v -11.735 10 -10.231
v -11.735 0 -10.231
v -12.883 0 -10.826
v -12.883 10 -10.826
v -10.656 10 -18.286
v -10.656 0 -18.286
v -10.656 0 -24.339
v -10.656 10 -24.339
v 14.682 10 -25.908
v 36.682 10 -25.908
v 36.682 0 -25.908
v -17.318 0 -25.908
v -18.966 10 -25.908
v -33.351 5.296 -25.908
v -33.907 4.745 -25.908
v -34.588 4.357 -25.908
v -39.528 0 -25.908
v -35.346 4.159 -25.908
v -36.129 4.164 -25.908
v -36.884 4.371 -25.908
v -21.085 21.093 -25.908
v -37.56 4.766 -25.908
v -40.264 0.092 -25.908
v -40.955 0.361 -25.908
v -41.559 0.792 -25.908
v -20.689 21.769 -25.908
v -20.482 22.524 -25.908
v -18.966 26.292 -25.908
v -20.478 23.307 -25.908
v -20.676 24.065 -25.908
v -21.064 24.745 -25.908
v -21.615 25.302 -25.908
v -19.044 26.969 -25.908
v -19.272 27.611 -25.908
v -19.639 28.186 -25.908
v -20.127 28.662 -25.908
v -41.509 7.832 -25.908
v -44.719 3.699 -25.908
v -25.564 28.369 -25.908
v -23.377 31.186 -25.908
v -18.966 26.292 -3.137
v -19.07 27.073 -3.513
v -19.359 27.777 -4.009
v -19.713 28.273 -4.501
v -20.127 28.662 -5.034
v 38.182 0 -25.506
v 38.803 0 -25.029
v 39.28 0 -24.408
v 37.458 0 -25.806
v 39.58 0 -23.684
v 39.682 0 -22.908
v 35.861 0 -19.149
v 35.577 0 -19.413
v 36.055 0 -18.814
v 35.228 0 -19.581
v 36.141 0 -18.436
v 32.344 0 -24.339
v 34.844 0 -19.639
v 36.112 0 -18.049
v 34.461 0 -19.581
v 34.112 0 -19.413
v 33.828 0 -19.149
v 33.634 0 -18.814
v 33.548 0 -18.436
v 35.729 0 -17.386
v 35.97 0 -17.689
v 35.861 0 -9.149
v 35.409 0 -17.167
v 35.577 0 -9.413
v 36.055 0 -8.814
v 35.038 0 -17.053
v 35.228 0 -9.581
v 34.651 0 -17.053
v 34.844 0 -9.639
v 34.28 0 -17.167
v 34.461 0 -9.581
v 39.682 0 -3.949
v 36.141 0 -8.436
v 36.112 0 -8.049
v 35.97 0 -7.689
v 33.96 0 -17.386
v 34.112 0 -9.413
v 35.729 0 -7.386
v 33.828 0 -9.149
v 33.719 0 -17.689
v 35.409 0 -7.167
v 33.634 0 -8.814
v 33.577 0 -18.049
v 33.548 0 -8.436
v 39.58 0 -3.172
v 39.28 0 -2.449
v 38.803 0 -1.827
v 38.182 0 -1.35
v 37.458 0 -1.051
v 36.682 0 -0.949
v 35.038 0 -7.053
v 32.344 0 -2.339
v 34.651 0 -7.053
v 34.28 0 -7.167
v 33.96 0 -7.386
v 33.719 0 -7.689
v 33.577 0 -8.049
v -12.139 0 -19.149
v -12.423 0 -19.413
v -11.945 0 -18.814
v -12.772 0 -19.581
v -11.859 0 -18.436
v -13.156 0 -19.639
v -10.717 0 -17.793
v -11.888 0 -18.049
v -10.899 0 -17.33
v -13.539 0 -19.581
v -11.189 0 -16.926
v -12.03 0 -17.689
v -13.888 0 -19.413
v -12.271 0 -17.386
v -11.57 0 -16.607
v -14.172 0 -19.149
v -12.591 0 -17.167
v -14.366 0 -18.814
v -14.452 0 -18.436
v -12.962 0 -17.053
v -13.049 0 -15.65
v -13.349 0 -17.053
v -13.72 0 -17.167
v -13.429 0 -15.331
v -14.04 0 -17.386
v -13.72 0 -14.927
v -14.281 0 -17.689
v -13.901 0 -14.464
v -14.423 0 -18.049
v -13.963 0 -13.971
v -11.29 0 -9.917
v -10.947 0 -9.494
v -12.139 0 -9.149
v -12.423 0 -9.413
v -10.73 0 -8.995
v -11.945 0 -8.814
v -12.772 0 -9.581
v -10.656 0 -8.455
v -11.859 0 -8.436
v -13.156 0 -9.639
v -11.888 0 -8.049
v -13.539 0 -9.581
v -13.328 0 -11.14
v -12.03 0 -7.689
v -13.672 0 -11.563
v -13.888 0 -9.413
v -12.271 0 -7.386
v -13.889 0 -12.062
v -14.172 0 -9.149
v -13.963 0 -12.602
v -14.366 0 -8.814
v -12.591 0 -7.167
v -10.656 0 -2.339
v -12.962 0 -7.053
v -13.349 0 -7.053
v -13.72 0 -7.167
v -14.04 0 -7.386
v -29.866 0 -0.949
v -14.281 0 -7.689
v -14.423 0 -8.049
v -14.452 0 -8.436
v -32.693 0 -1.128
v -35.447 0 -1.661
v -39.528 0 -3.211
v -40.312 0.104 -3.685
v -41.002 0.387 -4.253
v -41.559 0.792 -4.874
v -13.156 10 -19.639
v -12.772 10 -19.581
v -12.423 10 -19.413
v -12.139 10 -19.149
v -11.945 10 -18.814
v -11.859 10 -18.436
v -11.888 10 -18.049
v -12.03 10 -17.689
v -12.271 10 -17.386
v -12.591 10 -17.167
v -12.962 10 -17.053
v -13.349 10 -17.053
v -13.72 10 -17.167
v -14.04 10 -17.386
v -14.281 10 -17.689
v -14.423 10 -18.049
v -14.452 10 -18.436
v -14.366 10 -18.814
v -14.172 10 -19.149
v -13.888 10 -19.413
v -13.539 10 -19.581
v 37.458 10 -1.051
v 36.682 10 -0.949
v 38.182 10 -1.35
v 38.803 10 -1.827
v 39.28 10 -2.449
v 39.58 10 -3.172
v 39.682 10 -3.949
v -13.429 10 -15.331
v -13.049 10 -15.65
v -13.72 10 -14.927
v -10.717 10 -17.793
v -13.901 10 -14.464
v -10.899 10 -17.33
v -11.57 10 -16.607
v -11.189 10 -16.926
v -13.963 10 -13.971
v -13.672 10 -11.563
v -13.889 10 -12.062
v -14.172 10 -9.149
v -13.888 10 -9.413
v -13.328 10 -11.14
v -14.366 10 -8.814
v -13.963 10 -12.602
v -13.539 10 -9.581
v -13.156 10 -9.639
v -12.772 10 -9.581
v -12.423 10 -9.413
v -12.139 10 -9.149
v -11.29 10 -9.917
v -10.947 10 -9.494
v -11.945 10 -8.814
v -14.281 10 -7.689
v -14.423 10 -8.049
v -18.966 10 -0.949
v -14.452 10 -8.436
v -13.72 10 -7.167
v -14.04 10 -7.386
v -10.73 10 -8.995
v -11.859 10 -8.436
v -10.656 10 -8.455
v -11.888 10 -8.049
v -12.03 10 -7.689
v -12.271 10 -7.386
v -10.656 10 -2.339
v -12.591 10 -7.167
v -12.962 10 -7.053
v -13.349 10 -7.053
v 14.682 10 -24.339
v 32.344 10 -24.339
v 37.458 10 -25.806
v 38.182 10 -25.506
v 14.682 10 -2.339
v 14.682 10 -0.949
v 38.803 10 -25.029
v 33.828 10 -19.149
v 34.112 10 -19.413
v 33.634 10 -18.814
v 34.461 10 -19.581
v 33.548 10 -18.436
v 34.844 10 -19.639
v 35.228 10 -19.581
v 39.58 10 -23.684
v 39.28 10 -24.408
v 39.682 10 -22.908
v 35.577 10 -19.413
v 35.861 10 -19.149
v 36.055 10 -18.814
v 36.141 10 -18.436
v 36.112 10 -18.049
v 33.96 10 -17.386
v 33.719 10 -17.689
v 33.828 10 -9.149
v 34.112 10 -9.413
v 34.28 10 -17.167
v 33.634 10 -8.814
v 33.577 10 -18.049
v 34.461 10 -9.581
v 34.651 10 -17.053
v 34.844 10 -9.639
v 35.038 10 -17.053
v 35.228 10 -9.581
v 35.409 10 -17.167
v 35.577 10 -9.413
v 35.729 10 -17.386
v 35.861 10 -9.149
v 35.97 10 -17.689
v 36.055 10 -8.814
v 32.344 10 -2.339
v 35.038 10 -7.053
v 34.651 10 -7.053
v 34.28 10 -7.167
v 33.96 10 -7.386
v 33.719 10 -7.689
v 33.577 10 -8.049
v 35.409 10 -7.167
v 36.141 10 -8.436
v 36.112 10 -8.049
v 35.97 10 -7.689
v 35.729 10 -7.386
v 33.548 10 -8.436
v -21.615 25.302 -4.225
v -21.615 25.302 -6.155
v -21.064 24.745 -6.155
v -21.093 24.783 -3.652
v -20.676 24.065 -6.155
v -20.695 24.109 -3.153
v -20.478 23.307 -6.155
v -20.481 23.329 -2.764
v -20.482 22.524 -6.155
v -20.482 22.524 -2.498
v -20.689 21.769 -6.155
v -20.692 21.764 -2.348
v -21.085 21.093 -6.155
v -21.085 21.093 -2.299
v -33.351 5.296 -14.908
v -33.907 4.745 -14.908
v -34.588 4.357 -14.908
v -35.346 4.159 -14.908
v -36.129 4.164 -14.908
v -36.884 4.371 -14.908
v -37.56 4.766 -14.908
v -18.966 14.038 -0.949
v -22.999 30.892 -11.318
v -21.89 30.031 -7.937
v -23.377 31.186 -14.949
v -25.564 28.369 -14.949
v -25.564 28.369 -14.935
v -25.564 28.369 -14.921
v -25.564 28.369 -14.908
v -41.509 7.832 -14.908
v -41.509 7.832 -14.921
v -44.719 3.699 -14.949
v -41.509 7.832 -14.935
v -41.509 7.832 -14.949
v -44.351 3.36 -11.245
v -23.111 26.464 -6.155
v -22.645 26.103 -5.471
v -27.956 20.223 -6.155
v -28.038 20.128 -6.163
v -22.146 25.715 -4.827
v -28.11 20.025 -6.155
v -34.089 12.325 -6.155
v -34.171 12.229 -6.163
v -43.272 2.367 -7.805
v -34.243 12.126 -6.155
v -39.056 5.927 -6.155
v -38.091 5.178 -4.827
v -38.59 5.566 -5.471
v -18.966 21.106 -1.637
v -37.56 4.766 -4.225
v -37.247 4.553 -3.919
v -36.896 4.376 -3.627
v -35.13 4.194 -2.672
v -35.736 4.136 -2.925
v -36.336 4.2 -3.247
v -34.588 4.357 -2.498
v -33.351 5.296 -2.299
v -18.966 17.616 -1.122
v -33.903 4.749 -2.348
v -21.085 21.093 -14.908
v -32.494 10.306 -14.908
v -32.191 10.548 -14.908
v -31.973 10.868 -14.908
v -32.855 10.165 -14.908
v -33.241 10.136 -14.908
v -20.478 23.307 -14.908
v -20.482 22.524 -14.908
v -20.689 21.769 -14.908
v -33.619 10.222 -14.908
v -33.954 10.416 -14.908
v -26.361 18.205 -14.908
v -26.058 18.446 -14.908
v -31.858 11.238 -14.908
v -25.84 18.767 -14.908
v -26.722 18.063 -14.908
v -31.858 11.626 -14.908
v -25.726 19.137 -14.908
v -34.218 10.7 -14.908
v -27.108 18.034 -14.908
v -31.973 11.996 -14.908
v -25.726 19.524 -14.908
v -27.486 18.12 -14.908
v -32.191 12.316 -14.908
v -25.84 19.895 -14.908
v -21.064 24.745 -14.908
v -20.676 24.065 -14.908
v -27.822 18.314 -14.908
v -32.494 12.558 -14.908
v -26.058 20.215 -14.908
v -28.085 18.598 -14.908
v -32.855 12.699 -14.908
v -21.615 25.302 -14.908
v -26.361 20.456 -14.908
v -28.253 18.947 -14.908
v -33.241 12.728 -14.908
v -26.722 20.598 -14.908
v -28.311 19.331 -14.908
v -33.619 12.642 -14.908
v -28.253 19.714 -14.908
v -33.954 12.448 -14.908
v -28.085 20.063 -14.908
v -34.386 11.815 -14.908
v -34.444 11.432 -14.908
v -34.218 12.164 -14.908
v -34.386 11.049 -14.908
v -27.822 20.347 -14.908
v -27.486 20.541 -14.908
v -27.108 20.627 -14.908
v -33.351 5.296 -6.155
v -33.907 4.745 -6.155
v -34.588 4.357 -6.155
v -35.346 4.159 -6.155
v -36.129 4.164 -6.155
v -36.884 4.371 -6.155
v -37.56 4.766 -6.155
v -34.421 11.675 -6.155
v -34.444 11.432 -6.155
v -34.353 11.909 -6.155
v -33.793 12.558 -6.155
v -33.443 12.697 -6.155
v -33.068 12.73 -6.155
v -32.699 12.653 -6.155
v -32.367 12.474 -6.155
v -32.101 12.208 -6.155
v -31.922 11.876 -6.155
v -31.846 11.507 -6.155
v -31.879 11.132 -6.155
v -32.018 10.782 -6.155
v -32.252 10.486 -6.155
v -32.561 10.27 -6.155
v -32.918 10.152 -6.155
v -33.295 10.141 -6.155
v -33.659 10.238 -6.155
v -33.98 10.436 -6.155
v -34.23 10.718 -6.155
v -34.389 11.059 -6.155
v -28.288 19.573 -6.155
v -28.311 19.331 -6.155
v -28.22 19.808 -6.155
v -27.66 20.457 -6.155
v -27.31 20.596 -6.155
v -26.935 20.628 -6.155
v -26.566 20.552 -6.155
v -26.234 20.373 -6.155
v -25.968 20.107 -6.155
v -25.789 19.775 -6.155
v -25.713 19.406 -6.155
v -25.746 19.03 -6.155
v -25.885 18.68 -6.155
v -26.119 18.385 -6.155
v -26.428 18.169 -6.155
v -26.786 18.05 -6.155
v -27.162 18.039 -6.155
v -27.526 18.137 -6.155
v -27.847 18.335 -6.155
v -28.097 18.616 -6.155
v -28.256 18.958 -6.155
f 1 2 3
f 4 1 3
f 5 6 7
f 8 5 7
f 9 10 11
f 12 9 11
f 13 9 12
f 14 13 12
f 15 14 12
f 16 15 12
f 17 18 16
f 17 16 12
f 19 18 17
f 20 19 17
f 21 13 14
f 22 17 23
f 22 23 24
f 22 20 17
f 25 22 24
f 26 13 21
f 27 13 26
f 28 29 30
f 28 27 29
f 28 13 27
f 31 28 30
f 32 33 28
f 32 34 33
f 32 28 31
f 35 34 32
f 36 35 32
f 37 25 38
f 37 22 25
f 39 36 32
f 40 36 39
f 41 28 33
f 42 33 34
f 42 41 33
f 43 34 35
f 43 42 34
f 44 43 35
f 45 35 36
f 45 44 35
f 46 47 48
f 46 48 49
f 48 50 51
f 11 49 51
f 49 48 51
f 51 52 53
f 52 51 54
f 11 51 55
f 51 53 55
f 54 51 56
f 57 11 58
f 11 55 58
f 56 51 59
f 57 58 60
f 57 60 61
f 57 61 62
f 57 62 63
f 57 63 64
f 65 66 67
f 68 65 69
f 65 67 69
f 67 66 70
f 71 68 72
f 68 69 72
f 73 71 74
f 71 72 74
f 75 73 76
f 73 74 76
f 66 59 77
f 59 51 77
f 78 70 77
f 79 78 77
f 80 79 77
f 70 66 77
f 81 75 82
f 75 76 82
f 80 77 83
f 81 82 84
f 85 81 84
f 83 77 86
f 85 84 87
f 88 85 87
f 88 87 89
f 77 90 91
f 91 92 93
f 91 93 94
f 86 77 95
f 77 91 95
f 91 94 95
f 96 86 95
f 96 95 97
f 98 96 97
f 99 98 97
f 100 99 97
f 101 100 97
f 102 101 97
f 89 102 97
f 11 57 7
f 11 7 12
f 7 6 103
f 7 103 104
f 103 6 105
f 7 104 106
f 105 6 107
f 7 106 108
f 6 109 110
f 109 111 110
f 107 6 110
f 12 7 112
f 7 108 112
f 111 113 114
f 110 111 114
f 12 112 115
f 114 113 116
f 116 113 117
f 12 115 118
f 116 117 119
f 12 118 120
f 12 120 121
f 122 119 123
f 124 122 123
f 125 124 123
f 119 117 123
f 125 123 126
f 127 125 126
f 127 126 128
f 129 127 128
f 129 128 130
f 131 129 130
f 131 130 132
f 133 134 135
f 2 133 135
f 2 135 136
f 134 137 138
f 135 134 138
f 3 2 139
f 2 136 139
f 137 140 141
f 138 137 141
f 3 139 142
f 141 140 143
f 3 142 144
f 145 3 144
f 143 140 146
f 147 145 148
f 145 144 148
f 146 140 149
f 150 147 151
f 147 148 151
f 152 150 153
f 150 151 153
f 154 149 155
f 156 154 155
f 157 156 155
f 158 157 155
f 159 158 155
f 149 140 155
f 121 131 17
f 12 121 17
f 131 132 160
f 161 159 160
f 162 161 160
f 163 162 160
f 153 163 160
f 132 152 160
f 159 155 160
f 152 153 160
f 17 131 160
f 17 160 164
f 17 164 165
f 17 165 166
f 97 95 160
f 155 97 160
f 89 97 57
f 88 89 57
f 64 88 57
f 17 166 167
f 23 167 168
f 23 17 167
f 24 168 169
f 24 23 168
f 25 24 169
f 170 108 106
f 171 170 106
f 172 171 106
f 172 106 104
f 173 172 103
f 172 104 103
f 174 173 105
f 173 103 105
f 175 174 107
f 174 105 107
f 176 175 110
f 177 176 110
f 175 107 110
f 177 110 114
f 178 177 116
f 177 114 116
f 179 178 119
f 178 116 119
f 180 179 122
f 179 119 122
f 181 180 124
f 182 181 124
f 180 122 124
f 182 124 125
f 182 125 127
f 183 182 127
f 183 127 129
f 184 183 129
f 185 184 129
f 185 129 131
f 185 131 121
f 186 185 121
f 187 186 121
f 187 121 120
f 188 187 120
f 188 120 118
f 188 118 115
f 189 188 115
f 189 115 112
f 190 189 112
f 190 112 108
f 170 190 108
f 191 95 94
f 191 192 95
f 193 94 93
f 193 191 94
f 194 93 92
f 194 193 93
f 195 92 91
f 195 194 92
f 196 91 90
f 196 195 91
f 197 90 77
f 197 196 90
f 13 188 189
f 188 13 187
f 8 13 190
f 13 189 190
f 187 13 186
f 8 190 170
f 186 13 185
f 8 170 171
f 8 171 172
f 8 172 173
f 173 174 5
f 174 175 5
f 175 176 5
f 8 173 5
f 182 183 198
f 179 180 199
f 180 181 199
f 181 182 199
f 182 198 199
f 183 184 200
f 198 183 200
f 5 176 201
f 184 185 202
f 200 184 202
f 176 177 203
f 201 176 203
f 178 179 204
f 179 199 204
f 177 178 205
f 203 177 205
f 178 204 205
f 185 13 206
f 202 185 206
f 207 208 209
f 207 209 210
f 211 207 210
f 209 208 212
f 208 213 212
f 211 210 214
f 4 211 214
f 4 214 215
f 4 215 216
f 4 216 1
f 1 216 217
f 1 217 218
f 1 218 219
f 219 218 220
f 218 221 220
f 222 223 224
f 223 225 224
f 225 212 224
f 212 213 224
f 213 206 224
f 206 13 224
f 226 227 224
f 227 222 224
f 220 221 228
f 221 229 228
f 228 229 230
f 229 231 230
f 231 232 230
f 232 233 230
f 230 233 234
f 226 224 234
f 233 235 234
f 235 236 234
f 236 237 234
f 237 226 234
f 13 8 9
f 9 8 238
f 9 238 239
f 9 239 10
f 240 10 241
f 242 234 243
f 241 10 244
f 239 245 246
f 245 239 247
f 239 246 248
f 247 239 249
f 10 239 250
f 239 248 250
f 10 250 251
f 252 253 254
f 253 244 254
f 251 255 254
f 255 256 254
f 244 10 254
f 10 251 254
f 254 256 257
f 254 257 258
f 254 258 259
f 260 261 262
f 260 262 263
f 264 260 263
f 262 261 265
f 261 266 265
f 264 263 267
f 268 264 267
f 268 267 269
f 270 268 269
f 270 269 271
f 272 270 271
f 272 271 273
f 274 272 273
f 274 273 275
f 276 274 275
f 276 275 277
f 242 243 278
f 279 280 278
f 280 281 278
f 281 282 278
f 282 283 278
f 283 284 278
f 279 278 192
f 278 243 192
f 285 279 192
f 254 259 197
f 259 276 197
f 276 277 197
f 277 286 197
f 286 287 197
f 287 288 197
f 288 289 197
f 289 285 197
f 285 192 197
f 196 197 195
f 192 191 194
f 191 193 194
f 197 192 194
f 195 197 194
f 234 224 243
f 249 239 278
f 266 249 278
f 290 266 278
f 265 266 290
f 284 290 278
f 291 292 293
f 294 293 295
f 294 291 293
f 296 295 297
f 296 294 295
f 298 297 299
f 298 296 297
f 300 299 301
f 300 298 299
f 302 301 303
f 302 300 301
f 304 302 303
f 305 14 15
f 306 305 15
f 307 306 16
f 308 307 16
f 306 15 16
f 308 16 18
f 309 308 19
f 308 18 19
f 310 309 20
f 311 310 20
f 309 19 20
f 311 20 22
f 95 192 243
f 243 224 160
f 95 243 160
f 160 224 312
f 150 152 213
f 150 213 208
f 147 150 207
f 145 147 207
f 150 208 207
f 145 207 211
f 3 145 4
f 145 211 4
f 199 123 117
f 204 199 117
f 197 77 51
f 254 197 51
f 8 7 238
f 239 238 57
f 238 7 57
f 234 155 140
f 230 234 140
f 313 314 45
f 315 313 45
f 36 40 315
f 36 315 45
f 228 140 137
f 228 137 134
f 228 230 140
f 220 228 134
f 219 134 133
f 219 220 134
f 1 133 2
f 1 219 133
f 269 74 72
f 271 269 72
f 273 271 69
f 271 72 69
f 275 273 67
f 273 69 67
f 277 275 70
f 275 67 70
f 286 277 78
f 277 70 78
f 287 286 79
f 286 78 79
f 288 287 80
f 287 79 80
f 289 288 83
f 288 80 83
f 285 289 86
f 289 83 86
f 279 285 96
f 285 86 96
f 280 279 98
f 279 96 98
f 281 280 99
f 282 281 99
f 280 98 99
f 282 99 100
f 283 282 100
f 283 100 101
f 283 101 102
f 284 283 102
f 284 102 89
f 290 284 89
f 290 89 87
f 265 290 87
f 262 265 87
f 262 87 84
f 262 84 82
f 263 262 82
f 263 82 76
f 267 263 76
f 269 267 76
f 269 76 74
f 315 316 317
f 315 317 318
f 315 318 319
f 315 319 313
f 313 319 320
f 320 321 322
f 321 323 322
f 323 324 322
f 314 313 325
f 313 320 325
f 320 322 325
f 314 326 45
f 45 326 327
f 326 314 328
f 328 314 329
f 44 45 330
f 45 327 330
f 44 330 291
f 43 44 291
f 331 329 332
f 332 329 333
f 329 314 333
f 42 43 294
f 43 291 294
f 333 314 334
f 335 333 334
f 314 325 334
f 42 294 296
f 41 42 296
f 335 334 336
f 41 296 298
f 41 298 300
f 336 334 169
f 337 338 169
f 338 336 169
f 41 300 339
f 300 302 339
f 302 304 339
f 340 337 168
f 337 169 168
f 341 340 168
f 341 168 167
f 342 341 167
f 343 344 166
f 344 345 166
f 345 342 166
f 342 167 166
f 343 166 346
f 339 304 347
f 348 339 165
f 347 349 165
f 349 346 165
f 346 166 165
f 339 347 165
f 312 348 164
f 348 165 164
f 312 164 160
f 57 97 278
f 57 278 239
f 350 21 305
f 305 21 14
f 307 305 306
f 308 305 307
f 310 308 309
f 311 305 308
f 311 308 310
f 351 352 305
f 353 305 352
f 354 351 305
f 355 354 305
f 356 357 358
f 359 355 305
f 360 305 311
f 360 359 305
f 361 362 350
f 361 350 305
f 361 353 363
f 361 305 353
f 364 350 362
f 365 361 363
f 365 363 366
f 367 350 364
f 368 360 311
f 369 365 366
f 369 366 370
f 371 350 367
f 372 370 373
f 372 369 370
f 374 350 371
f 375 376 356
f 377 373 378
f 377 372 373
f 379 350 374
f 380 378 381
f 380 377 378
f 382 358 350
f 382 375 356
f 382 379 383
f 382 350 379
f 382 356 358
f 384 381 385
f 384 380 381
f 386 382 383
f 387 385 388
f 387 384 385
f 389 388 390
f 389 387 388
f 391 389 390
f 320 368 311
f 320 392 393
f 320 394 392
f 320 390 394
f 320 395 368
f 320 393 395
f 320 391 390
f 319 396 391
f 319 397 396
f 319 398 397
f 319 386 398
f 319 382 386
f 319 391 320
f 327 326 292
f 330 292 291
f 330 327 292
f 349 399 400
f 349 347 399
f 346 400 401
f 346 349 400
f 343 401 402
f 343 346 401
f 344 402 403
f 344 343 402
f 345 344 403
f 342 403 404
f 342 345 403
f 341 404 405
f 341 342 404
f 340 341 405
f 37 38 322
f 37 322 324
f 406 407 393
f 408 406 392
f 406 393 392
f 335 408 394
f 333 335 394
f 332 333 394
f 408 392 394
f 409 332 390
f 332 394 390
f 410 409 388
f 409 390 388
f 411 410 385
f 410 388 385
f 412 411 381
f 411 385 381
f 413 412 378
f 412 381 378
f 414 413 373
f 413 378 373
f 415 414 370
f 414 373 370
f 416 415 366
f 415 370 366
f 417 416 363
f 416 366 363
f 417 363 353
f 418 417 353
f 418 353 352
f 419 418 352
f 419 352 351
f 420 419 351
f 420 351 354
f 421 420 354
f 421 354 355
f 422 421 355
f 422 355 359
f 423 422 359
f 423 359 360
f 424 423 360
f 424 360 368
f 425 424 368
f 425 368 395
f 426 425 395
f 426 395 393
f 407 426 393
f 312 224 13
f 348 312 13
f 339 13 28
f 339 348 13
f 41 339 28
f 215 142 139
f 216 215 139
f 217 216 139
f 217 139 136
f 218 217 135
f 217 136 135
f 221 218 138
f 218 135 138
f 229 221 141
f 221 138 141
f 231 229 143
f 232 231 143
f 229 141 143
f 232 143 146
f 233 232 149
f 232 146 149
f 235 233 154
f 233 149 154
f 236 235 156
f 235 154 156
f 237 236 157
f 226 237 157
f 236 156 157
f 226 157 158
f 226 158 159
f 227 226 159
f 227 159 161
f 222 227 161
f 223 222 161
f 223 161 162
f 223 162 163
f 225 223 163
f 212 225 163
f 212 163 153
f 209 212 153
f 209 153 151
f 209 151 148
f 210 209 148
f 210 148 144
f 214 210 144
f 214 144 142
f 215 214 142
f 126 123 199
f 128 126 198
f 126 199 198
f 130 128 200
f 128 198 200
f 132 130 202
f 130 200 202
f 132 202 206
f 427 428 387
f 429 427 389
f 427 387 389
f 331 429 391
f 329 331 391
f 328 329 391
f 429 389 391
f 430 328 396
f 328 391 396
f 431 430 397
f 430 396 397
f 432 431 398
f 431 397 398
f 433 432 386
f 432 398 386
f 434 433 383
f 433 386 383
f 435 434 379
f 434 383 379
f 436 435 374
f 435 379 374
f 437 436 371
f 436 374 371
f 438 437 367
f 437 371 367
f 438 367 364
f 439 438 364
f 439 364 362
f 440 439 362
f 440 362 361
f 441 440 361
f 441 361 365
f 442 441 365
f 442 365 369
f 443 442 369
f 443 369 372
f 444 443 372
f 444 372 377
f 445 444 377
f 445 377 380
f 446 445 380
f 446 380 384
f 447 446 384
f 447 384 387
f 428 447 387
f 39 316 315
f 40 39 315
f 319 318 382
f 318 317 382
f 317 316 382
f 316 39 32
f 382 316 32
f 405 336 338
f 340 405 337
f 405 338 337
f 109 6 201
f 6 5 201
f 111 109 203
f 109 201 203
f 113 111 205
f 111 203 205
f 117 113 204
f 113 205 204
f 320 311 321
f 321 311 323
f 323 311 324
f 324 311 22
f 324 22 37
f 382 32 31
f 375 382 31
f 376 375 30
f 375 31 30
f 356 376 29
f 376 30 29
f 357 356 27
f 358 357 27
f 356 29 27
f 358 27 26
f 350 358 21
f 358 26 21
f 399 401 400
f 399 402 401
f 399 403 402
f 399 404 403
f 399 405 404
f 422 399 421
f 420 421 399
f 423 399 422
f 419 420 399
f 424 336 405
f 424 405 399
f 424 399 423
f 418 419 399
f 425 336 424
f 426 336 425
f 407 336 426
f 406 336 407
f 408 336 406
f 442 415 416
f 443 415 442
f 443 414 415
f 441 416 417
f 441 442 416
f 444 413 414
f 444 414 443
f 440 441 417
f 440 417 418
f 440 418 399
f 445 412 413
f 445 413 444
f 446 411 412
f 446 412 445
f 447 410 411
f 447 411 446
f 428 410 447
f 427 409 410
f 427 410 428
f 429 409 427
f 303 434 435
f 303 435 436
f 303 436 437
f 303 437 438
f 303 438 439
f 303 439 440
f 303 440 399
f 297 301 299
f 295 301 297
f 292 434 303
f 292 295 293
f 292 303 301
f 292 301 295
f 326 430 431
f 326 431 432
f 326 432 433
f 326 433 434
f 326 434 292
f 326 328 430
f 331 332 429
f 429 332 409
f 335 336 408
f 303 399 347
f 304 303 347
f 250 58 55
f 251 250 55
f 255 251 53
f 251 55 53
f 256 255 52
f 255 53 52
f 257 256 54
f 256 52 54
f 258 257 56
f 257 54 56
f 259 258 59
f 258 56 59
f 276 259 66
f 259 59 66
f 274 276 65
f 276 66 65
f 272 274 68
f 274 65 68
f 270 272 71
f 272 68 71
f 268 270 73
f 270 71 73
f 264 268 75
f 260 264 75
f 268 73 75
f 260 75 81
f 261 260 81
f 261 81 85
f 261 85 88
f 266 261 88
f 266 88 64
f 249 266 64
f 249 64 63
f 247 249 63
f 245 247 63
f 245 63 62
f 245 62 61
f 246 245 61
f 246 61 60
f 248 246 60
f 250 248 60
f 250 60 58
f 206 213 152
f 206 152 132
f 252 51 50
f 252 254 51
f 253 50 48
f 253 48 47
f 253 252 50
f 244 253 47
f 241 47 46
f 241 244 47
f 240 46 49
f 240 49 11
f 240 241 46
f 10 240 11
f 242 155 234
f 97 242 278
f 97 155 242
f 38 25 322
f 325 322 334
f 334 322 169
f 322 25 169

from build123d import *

# Parameters (mm, degrees)
CROQUIS1_W                        = 57
CROQUIS1_H                        = 24.959470006
CROQUIS1_W_2                      = 43
CROQUIS1_H_2                      = 22
MAIN_DEPTH                        = 28
CORTE_CAJA_REACH                  = 56.604
CROQUIS2_W                        = 27.955905163
CROQUIS2_H                        = 20.987971864
CROQUIS3_W                        = 32
CROQUIS3_H                        = 24.959470006
SALIENTE_EXTRUIR2_DEPTH           = 2.25
REDONDEO_LATERALES_R              = 3
CROQUIS7_R                        = 1.3
TALADROS_BASE_DEPTH               = 11
CAJEADO_CABLE_DEPTH               = 10
CAJEADO_REDONDEO_R                = 2
SOPORTE_EN_ANGULO_DEPTH           = 24.959470007
CAJA_PARA_SOPORTE_DEPTH           = 11
CROQUIS12_R                       = 1.3
TALADROS_CAJA_SOPORTE_DEPTH       = 13.959470007
CROQUIS15_W                       = 60.00042655
CROQUIS15_H                       = 27.426571923
RECORTE_CAJA_DEPTH                = 24.959470007
CHAFLAN_SUPERIOR_SOPORTE_DEPTH    = 24.959470007
REDONDEO_ARISTAS_SOPORTE_R        = 3
REDONDEO_SOPORTE_R                = 14
CROQUIS17_W                       = 6.155207263
CROQUIS17_H                       = 26
CAJA_TORNILLOS_SOPORTE_DEPTH      = 8
REDONDEO_CAJA_TORNILLOS_SOPORTE_R = 3


with BuildPart() as part:
    # Croquis1 → Main (new body)
    with BuildSketch(Plane(origin=(0, 0, 0), x_dir=(1, 0, 0), z_dir=(0, 1, 0))):
        with Locations((11.181999645, 13.428246359)):
            Rectangle(CROQUIS1_W, CROQUIS1_H)
        with Locations((10.844499645, 13.338562849)):
            Rectangle(CROQUIS1_W_2, CROQUIS1_H_2, mode=Mode.SUBTRACT)
    extrude(amount=MAIN_DEPTH)

    # Corte Caja: up to this face of the body (flat: up to its plane)
    corte_caja_end = Plane(part.part.faces().sort_by_distance((11.181999645, 14, -25.907981362))[0])
    # Croquis2 → Corte Caja (cut, up to the picked face)
    with BuildSketch(Plane.XY.offset(-0.948511356), mode=Mode.PRIVATE) as corte_caja_sk1:
        with Locations((28.659952227, 20.493985932)):
            Rectangle(CROQUIS2_W, CROQUIS2_H)
    corte_caja_tool1 = split(extrude(corte_caja_sk1.sketch, amount=-CORTE_CAJA_REACH, mode=Mode.PRIVATE), bisect_by=corte_caja_end, keep=Keep.BOTH, mode=Mode.PRIVATE)
    add(corte_caja_tool1.solids().sort_by(Axis((28.659952, 20.493986, -0.948511), (0, 0, -1)))[0], mode=Mode.SUBTRACT)

    # Croquis3 → Saliente-Extruir2 (add)
    with BuildSketch(Plane(origin=(0, 28, 0), x_dir=(1, 0, 0), z_dir=(0, 1, 0))):
        with Locations((-1.318000355, 13.428246359)):
            Rectangle(CROQUIS3_W, CROQUIS3_H)
    extrude(amount=SALIENTE_EXTRUIR2_DEPTH)

    # Redondeo Laterales
    redondeo_laterales_edges = [part.edges().sort_by_distance(p)[0] for p in [
        (39.681999645, 5, -25.907981362),
        (39.681999645, 5, -0.948511356),
    ]]
    fillet(redondeo_laterales_edges, radius=REDONDEO_LATERALES_R)

    # Croquis7 → Taladros Base (cut)
    with BuildSketch(Plane.XZ):
        with Locations(Location((-13.155500355, -8.338562849, 0), (0, 0, 270))):
            Circle(CROQUIS7_R)
        with Locations(Location((-13.155500355, -18.338562849, 0), (0, 0, 270))):
            Circle(CROQUIS7_R)
        with Locations(Location((34.844499645, -8.338562849, 0), (0, 0, 270))):
            Circle(CROQUIS7_R)
        with Locations(Location((34.844499645, -18.338562849, 0), (0, 0, 270))):
            Circle(CROQUIS7_R)
    extrude(amount=-TALADROS_BASE_DEPTH, mode=Mode.SUBTRACT)

    # Croquis8 → Cajeado cable (cut)
    with BuildSketch(Plane.XZ):
        Polygon((-10.655500355, -17.197519433), (-10.655500355, -9.671098091), (-13.962983419, -11.385752006), (-13.962983419, -15.059503242), align=None)
    extrude(amount=-CAJEADO_CABLE_DEPTH, mode=Mode.SUBTRACT)

    # Cajeado Redondeo
    cajeado_redondeo_edges = [part.edges().sort_by_distance(p)[0] for p in [
        (-13.962983419, 5, -11.385752006),
        (-10.655500355, 5, -9.671098091),
        (-10.655500355, 5, -17.197519433),
        (-13.962983419, 5, -15.059503242),
    ]]
    fillet(cajeado_redondeo_edges, radius=CAJEADO_REDONDEO_R)

    # Croquis10 → Soporte en angulo (add)
    with BuildSketch(Plane.XY.offset(-0.948511356)):
        Polygon((-17.318000355, 30.25), (-17.318000355, 0), (-40.697936457, 0), (-44.719041018, 3.698501078), (-22.354269001, 32.502718411), (-18.018493057, 32.502718411), align=None)
    extrude(amount=-SOPORTE_EN_ANGULO_DEPTH)

    # Croquis11 → Caja para soporte (cut)
    with BuildSketch(Plane(origin=(0, 0, -25.907981362), x_dir=(-1, 0, 0), z_dir=(0, 0, -1))):
        with BuildLine():
            Line((41.509326916, 7.83238192), (25.563983103, 28.36883757))
            Line((25.563983103, 28.36883757), (21.614664709, 25.302425298))
            ThreePointArc((21.614664709, 25.302425298), (20.477989634, 23.307419605), (21.084921035, 21.092986898))
            Line((21.084921035, 21.092986898), (33.350570122, 5.295713321))
            ThreePointArc((33.350570122, 5.295713321), (35.345575815, 4.159038247), (37.560008522, 4.765969648))
            Line((37.560008522, 4.765969648), (41.509326916, 7.83238192))
        make_face()
    extrude(amount=-CAJA_PARA_SOPORTE_DEPTH, mode=Mode.SUBTRACT)

    # Croquis12 → Taladros caja soporte (cut)
    with BuildSketch(Plane(origin=(0, 0, -14.907981362), x_dir=(-1, 0, 0), z_dir=(0, 0, -1))):
        with Locations((27.011052418, 19.330608197)):
            Circle(CROQUIS12_R)
        with Locations((33.143876962, 11.431971409)):
            Circle(CROQUIS12_R)
    extrude(amount=-TALADROS_CAJA_SOPORTE_DEPTH, mode=Mode.SUBTRACT)

    # Croquis15 → Recorte Caja (cut)
    with BuildSketch(Plane.XY.offset(-0.948511356)):
        with Locations((11.033774869, 23.713285962)):
            Rectangle(CROQUIS15_W, CROQUIS15_H)
    extrude(amount=-RECORTE_CAJA_DEPTH, mode=Mode.SUBTRACT)

    # Croquis16 → Chaflan superior soporte (cut)
    with BuildSketch(Plane(origin=(0, 0, -25.907981362), x_dir=(-1, 0, 0), z_dir=(0, 0, -1))):
        Polygon((26.059899943, 33.268736427), (17.368016439, 26.520002701), (17.368016439, 33.268736427), align=None)
    extrude(amount=-CHAFLAN_SUPERIOR_SOPORTE_DEPTH, mode=Mode.SUBTRACT)

    # Redondeo aristas soporte
    redondeo_aristas_soporte_edges = [part.edges().sort_by_distance(p)[0] for p in [
        (-40.697936457, 0, -13.428246359),
        (-18.966438406, 27.761082869, -13.428246359),
    ]]
    fillet(redondeo_aristas_soporte_edges, radius=REDONDEO_ARISTAS_SOPORTE_R)

    # Redondeo soporte
    # the kernel refuses this fillet: 14 mm, written as the material it takes off along each edge
    with BuildSketch(Plane(origin=(-66.183926921, -23.946727682, -0.948511356), x_dir=(0.7898636788540391, -0.6132824543610909, 0), z_dir=(0.6132824543610909, 0.7898636788540392, 0))) as redondeo_soporte_piece_1:
        with BuildLine():
            CenterArc((REDONDEO_SOPORTE_R, REDONDEO_SOPORTE_R), REDONDEO_SOPORTE_R, 180, 90)
            Line((0, REDONDEO_SOPORTE_R), (0, 0))
            Line((0, 0), (REDONDEO_SOPORTE_R, 0))
        make_face()
    extrude(amount=104.799778712, mode=Mode.SUBTRACT)

    # Croquis17 → Caja tornillos soporte (cut)
    with BuildSketch(Plane(origin=(-29.691111601, 23.053392988, 0), x_dir=(0, 0, 1), z_dir=(-0.789863678854039, 0.6132824543610911, 0))):
        with Locations((-3.077603632, -6.270427893)):
            Rectangle(CROQUIS17_W, CROQUIS17_H)
    extrude(amount=-CAJA_TORNILLOS_SOPORTE_DEPTH, mode=Mode.SUBTRACT)

    # redondeo Caja tornillos soporte
    redondeo_caja_tornillos_soporte_edges = [part.edges().sort_by_distance(p)[0] for p in [
        (-35.190417485, 2.926122285, -4.227303989),
        (-19.245073672, 23.462577935, -4.227303989),
    ]]
    fillet(redondeo_caja_tornillos_soporte_edges, radius=REDONDEO_CAJA_TORNILLOS_SOPORTE_R)


solid = part.part
